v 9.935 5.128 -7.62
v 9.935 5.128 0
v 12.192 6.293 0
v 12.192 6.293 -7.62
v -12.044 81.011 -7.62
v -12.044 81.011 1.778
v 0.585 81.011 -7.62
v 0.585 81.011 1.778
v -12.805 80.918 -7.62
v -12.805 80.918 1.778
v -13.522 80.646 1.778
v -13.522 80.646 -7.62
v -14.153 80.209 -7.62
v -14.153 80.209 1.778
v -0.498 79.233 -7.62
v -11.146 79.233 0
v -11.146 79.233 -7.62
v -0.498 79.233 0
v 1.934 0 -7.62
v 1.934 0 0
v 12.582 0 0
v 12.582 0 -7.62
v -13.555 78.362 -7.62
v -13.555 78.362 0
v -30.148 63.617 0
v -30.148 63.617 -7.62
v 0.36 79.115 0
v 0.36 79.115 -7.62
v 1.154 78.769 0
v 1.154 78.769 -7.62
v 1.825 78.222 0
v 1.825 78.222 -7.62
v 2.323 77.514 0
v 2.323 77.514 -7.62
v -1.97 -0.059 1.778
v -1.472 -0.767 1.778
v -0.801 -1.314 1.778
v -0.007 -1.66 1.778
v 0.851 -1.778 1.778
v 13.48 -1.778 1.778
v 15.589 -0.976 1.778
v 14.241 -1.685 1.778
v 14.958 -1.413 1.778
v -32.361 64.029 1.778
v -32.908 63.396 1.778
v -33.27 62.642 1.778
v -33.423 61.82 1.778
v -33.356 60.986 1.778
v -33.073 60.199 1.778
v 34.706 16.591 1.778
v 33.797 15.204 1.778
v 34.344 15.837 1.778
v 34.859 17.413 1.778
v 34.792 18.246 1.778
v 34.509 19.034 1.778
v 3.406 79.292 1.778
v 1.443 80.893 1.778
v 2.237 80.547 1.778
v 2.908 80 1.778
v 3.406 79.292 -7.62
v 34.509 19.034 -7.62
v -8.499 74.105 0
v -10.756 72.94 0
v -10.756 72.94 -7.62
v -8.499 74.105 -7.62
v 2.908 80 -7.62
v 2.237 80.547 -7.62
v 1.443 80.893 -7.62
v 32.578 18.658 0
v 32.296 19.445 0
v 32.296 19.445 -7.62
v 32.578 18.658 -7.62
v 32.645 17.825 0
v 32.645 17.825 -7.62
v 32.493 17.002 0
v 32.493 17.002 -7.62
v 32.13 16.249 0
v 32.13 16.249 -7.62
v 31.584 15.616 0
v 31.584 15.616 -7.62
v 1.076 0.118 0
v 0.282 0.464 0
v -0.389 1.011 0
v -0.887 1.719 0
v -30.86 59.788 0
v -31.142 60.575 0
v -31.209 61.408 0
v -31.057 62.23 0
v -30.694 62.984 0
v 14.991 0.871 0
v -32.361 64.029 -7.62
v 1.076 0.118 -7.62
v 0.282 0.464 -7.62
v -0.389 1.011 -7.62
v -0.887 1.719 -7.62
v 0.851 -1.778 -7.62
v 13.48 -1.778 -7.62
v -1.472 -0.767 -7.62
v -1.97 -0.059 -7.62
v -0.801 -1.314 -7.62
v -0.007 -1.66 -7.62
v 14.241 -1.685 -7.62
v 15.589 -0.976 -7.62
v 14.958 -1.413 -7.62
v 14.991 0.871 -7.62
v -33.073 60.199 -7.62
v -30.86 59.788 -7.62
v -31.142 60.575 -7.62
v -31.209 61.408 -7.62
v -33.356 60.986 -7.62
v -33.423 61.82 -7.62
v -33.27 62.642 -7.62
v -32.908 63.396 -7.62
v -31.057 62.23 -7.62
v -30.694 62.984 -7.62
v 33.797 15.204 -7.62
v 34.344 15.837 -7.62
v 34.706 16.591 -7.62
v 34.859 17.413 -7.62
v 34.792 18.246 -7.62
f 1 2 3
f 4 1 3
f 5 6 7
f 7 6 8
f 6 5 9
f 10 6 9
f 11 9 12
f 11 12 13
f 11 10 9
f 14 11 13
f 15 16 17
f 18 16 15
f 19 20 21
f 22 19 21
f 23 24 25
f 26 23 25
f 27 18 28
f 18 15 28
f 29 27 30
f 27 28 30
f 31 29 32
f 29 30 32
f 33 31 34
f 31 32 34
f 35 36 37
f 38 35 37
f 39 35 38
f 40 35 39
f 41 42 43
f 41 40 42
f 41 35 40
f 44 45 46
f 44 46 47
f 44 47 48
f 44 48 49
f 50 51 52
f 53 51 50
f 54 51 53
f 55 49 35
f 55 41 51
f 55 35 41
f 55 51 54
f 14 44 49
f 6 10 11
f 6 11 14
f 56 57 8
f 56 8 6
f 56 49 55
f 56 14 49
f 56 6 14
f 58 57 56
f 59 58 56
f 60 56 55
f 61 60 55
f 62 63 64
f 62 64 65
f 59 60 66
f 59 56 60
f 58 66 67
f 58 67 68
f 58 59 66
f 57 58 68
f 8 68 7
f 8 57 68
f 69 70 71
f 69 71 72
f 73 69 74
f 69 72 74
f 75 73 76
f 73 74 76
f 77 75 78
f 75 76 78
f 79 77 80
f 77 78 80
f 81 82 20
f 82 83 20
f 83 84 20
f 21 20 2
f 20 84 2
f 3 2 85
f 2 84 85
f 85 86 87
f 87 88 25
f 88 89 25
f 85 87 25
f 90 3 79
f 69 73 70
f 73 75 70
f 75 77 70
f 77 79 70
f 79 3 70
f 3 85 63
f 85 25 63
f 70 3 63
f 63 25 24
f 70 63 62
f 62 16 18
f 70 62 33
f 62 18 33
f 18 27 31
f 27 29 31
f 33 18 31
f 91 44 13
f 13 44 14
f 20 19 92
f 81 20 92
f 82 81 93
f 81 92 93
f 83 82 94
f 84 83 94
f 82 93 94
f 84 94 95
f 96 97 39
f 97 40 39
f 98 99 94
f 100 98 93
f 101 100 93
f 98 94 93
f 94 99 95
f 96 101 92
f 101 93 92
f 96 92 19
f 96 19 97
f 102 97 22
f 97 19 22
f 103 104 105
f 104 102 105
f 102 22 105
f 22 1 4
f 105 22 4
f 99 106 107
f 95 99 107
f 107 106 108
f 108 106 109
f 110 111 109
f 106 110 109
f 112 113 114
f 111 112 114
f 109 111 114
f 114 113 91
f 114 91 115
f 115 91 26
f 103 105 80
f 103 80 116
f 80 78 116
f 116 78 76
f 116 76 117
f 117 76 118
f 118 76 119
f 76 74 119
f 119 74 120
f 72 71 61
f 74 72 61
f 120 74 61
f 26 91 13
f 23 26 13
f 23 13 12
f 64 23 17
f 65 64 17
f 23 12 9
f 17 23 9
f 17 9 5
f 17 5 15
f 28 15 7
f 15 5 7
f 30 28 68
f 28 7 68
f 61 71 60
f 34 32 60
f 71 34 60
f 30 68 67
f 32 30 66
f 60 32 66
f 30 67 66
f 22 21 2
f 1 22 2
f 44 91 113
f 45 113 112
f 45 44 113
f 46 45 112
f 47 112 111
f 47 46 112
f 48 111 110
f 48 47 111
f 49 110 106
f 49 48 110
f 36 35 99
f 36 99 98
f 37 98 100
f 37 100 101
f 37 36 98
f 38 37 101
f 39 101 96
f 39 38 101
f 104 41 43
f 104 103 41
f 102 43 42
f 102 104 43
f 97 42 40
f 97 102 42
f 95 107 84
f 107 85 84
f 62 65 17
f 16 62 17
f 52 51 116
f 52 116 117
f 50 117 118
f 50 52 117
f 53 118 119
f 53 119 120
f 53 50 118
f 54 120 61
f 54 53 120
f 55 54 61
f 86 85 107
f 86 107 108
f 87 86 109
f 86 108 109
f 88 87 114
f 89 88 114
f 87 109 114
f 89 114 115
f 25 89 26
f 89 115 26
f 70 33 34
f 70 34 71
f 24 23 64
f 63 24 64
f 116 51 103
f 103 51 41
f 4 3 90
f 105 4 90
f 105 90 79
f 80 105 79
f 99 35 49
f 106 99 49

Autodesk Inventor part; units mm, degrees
ref_plane "YZ Plane" through (0, 0, 0) normal (1, 0, 0) x (0, 1, 0)
ref_plane "XZ Plane" through (0, 0, 0) normal (0, 1, 0) x (-1, 0, 0)
ref_plane "XY Plane" through (0, 0, 0) normal (0, 0, 1) x (1, 0, 0)
sketch "TopProfile" plane through (0, 0, 0) normal (0, 0, 1) x (1, 0, 0)
  line L0 (-12.5751, 79.2329) -> (-31.9912, 61.979)
  line L1 (1.4359, 79.2329) -> (-31.9912, 61.979) construction
  line L2 (-12.5751, 79.2329) -> (1.4359, 79.2329)
  line L3 (-31.9912, 61.979) -> (0, 0)
  line L4 (1.4359, 79.2329) -> (33.4272, 17.2538)
  line L5 (0, 0) -> (33.4272, 17.2538) construction
  line L6 (14.011, 0) -> (33.4272, 17.2538)
  line L7 (0, 0) -> (14.011, 0)
  line L8 (-48.1736, 0) -> (49.6096, 0) construction
  line L9 (-10.7561, 72.9398) -> (-8.499, 74.1048)
  line L10 (-8.499, 74.1048) -> (-11.4466, 79.8154)
  line L11 (-11.4466, 79.8154) -> (-13.7036, 78.6504)
  line L12 (-13.7036, 78.6504) -> (-10.7561, 72.9398)
  line L13 (9.9349, 5.128) -> (12.192, 6.293)
  line L14 (12.192, 6.293) -> (15.1396, 0.5825)
  line L15 (15.1396, 0.5825) -> (12.8825, -0.5825)
  line L16 (12.8825, -0.5825) -> (9.9349, 5.128)
  line L17 (35.6405, 16.8421) -> (14.6869, -1.778)
  line L18 (14.6869, -1.778) -> (-1.0831, -1.778)
  line L19 (-1.0831, -1.778) -> (-34.2046, 62.3907)
  line L20 (-34.2046, 62.3907) -> (-13.2509, 81.0109)
  line L21 (-13.2509, 81.0109) -> (2.5191, 81.0109)
  line L22 (2.5191, 81.0109) -> (35.6405, 16.8421)
  point P0 (-11.1459, 79.2329)
  point P1 (-13.5549, 78.3622)
  point P2 (14.9908, 0.8707)
  point P3 (12.5818, 0)
  dimension "d0" = 37.6174
  dimension "d1" = 165.676
  dimension "d2" = 19.4161
  dimension "d3" = 69.7484
  dimension "d4" = 62.699
  dimension "d5" = 37.6174
  dimension "d6" = 165.676
  dimension "d15" = 2.54
  dimension "d16" = 1.778
extrude "CapFeature" add sketch "TopProfile" along normal blind 1.778 contours L2 L10 L9 L12 L0 | L11 L10 L2 | L0 L12 L11 | L12 L9 L10 L2 L4 L6 L14 L13 L16 L7 L3 L0 | L16 L13 L14 L6 L7 | L7 L15 L16 | L14 L15 L6 | L17 L18 L19 L20 L21 L22
extrude "WallsFeature" add sketch "TopProfile" against normal blind 7.62 contours L2 L10 L9 L12 L0 | L11 L10 L2 | L0 L12 L11 | L16 L13 L14 L6 L7 | L7 L15 L16 | L14 L15 L6 | L17 L18 L19 L20 L21 L22
fillet "SideFilletsFeature" radius 3.175 10 edges at (-31.9912, 61.979, -3.81) (0, 0, -3.81) (33.4272, 17.2538, -3.81) (1.4359, 79.2329, -3.81) (2.5191, 81.0109, -2.921) (-13.2509, 81.0109, -2.921) (-34.2046, 62.3907, -2.921) (35.6405, 16.8421, -2.921) (14.6869, -1.778, -2.921) (-1.0831, -1.778, -2.921)
properties part number "switchback-pickup-cover-6"
